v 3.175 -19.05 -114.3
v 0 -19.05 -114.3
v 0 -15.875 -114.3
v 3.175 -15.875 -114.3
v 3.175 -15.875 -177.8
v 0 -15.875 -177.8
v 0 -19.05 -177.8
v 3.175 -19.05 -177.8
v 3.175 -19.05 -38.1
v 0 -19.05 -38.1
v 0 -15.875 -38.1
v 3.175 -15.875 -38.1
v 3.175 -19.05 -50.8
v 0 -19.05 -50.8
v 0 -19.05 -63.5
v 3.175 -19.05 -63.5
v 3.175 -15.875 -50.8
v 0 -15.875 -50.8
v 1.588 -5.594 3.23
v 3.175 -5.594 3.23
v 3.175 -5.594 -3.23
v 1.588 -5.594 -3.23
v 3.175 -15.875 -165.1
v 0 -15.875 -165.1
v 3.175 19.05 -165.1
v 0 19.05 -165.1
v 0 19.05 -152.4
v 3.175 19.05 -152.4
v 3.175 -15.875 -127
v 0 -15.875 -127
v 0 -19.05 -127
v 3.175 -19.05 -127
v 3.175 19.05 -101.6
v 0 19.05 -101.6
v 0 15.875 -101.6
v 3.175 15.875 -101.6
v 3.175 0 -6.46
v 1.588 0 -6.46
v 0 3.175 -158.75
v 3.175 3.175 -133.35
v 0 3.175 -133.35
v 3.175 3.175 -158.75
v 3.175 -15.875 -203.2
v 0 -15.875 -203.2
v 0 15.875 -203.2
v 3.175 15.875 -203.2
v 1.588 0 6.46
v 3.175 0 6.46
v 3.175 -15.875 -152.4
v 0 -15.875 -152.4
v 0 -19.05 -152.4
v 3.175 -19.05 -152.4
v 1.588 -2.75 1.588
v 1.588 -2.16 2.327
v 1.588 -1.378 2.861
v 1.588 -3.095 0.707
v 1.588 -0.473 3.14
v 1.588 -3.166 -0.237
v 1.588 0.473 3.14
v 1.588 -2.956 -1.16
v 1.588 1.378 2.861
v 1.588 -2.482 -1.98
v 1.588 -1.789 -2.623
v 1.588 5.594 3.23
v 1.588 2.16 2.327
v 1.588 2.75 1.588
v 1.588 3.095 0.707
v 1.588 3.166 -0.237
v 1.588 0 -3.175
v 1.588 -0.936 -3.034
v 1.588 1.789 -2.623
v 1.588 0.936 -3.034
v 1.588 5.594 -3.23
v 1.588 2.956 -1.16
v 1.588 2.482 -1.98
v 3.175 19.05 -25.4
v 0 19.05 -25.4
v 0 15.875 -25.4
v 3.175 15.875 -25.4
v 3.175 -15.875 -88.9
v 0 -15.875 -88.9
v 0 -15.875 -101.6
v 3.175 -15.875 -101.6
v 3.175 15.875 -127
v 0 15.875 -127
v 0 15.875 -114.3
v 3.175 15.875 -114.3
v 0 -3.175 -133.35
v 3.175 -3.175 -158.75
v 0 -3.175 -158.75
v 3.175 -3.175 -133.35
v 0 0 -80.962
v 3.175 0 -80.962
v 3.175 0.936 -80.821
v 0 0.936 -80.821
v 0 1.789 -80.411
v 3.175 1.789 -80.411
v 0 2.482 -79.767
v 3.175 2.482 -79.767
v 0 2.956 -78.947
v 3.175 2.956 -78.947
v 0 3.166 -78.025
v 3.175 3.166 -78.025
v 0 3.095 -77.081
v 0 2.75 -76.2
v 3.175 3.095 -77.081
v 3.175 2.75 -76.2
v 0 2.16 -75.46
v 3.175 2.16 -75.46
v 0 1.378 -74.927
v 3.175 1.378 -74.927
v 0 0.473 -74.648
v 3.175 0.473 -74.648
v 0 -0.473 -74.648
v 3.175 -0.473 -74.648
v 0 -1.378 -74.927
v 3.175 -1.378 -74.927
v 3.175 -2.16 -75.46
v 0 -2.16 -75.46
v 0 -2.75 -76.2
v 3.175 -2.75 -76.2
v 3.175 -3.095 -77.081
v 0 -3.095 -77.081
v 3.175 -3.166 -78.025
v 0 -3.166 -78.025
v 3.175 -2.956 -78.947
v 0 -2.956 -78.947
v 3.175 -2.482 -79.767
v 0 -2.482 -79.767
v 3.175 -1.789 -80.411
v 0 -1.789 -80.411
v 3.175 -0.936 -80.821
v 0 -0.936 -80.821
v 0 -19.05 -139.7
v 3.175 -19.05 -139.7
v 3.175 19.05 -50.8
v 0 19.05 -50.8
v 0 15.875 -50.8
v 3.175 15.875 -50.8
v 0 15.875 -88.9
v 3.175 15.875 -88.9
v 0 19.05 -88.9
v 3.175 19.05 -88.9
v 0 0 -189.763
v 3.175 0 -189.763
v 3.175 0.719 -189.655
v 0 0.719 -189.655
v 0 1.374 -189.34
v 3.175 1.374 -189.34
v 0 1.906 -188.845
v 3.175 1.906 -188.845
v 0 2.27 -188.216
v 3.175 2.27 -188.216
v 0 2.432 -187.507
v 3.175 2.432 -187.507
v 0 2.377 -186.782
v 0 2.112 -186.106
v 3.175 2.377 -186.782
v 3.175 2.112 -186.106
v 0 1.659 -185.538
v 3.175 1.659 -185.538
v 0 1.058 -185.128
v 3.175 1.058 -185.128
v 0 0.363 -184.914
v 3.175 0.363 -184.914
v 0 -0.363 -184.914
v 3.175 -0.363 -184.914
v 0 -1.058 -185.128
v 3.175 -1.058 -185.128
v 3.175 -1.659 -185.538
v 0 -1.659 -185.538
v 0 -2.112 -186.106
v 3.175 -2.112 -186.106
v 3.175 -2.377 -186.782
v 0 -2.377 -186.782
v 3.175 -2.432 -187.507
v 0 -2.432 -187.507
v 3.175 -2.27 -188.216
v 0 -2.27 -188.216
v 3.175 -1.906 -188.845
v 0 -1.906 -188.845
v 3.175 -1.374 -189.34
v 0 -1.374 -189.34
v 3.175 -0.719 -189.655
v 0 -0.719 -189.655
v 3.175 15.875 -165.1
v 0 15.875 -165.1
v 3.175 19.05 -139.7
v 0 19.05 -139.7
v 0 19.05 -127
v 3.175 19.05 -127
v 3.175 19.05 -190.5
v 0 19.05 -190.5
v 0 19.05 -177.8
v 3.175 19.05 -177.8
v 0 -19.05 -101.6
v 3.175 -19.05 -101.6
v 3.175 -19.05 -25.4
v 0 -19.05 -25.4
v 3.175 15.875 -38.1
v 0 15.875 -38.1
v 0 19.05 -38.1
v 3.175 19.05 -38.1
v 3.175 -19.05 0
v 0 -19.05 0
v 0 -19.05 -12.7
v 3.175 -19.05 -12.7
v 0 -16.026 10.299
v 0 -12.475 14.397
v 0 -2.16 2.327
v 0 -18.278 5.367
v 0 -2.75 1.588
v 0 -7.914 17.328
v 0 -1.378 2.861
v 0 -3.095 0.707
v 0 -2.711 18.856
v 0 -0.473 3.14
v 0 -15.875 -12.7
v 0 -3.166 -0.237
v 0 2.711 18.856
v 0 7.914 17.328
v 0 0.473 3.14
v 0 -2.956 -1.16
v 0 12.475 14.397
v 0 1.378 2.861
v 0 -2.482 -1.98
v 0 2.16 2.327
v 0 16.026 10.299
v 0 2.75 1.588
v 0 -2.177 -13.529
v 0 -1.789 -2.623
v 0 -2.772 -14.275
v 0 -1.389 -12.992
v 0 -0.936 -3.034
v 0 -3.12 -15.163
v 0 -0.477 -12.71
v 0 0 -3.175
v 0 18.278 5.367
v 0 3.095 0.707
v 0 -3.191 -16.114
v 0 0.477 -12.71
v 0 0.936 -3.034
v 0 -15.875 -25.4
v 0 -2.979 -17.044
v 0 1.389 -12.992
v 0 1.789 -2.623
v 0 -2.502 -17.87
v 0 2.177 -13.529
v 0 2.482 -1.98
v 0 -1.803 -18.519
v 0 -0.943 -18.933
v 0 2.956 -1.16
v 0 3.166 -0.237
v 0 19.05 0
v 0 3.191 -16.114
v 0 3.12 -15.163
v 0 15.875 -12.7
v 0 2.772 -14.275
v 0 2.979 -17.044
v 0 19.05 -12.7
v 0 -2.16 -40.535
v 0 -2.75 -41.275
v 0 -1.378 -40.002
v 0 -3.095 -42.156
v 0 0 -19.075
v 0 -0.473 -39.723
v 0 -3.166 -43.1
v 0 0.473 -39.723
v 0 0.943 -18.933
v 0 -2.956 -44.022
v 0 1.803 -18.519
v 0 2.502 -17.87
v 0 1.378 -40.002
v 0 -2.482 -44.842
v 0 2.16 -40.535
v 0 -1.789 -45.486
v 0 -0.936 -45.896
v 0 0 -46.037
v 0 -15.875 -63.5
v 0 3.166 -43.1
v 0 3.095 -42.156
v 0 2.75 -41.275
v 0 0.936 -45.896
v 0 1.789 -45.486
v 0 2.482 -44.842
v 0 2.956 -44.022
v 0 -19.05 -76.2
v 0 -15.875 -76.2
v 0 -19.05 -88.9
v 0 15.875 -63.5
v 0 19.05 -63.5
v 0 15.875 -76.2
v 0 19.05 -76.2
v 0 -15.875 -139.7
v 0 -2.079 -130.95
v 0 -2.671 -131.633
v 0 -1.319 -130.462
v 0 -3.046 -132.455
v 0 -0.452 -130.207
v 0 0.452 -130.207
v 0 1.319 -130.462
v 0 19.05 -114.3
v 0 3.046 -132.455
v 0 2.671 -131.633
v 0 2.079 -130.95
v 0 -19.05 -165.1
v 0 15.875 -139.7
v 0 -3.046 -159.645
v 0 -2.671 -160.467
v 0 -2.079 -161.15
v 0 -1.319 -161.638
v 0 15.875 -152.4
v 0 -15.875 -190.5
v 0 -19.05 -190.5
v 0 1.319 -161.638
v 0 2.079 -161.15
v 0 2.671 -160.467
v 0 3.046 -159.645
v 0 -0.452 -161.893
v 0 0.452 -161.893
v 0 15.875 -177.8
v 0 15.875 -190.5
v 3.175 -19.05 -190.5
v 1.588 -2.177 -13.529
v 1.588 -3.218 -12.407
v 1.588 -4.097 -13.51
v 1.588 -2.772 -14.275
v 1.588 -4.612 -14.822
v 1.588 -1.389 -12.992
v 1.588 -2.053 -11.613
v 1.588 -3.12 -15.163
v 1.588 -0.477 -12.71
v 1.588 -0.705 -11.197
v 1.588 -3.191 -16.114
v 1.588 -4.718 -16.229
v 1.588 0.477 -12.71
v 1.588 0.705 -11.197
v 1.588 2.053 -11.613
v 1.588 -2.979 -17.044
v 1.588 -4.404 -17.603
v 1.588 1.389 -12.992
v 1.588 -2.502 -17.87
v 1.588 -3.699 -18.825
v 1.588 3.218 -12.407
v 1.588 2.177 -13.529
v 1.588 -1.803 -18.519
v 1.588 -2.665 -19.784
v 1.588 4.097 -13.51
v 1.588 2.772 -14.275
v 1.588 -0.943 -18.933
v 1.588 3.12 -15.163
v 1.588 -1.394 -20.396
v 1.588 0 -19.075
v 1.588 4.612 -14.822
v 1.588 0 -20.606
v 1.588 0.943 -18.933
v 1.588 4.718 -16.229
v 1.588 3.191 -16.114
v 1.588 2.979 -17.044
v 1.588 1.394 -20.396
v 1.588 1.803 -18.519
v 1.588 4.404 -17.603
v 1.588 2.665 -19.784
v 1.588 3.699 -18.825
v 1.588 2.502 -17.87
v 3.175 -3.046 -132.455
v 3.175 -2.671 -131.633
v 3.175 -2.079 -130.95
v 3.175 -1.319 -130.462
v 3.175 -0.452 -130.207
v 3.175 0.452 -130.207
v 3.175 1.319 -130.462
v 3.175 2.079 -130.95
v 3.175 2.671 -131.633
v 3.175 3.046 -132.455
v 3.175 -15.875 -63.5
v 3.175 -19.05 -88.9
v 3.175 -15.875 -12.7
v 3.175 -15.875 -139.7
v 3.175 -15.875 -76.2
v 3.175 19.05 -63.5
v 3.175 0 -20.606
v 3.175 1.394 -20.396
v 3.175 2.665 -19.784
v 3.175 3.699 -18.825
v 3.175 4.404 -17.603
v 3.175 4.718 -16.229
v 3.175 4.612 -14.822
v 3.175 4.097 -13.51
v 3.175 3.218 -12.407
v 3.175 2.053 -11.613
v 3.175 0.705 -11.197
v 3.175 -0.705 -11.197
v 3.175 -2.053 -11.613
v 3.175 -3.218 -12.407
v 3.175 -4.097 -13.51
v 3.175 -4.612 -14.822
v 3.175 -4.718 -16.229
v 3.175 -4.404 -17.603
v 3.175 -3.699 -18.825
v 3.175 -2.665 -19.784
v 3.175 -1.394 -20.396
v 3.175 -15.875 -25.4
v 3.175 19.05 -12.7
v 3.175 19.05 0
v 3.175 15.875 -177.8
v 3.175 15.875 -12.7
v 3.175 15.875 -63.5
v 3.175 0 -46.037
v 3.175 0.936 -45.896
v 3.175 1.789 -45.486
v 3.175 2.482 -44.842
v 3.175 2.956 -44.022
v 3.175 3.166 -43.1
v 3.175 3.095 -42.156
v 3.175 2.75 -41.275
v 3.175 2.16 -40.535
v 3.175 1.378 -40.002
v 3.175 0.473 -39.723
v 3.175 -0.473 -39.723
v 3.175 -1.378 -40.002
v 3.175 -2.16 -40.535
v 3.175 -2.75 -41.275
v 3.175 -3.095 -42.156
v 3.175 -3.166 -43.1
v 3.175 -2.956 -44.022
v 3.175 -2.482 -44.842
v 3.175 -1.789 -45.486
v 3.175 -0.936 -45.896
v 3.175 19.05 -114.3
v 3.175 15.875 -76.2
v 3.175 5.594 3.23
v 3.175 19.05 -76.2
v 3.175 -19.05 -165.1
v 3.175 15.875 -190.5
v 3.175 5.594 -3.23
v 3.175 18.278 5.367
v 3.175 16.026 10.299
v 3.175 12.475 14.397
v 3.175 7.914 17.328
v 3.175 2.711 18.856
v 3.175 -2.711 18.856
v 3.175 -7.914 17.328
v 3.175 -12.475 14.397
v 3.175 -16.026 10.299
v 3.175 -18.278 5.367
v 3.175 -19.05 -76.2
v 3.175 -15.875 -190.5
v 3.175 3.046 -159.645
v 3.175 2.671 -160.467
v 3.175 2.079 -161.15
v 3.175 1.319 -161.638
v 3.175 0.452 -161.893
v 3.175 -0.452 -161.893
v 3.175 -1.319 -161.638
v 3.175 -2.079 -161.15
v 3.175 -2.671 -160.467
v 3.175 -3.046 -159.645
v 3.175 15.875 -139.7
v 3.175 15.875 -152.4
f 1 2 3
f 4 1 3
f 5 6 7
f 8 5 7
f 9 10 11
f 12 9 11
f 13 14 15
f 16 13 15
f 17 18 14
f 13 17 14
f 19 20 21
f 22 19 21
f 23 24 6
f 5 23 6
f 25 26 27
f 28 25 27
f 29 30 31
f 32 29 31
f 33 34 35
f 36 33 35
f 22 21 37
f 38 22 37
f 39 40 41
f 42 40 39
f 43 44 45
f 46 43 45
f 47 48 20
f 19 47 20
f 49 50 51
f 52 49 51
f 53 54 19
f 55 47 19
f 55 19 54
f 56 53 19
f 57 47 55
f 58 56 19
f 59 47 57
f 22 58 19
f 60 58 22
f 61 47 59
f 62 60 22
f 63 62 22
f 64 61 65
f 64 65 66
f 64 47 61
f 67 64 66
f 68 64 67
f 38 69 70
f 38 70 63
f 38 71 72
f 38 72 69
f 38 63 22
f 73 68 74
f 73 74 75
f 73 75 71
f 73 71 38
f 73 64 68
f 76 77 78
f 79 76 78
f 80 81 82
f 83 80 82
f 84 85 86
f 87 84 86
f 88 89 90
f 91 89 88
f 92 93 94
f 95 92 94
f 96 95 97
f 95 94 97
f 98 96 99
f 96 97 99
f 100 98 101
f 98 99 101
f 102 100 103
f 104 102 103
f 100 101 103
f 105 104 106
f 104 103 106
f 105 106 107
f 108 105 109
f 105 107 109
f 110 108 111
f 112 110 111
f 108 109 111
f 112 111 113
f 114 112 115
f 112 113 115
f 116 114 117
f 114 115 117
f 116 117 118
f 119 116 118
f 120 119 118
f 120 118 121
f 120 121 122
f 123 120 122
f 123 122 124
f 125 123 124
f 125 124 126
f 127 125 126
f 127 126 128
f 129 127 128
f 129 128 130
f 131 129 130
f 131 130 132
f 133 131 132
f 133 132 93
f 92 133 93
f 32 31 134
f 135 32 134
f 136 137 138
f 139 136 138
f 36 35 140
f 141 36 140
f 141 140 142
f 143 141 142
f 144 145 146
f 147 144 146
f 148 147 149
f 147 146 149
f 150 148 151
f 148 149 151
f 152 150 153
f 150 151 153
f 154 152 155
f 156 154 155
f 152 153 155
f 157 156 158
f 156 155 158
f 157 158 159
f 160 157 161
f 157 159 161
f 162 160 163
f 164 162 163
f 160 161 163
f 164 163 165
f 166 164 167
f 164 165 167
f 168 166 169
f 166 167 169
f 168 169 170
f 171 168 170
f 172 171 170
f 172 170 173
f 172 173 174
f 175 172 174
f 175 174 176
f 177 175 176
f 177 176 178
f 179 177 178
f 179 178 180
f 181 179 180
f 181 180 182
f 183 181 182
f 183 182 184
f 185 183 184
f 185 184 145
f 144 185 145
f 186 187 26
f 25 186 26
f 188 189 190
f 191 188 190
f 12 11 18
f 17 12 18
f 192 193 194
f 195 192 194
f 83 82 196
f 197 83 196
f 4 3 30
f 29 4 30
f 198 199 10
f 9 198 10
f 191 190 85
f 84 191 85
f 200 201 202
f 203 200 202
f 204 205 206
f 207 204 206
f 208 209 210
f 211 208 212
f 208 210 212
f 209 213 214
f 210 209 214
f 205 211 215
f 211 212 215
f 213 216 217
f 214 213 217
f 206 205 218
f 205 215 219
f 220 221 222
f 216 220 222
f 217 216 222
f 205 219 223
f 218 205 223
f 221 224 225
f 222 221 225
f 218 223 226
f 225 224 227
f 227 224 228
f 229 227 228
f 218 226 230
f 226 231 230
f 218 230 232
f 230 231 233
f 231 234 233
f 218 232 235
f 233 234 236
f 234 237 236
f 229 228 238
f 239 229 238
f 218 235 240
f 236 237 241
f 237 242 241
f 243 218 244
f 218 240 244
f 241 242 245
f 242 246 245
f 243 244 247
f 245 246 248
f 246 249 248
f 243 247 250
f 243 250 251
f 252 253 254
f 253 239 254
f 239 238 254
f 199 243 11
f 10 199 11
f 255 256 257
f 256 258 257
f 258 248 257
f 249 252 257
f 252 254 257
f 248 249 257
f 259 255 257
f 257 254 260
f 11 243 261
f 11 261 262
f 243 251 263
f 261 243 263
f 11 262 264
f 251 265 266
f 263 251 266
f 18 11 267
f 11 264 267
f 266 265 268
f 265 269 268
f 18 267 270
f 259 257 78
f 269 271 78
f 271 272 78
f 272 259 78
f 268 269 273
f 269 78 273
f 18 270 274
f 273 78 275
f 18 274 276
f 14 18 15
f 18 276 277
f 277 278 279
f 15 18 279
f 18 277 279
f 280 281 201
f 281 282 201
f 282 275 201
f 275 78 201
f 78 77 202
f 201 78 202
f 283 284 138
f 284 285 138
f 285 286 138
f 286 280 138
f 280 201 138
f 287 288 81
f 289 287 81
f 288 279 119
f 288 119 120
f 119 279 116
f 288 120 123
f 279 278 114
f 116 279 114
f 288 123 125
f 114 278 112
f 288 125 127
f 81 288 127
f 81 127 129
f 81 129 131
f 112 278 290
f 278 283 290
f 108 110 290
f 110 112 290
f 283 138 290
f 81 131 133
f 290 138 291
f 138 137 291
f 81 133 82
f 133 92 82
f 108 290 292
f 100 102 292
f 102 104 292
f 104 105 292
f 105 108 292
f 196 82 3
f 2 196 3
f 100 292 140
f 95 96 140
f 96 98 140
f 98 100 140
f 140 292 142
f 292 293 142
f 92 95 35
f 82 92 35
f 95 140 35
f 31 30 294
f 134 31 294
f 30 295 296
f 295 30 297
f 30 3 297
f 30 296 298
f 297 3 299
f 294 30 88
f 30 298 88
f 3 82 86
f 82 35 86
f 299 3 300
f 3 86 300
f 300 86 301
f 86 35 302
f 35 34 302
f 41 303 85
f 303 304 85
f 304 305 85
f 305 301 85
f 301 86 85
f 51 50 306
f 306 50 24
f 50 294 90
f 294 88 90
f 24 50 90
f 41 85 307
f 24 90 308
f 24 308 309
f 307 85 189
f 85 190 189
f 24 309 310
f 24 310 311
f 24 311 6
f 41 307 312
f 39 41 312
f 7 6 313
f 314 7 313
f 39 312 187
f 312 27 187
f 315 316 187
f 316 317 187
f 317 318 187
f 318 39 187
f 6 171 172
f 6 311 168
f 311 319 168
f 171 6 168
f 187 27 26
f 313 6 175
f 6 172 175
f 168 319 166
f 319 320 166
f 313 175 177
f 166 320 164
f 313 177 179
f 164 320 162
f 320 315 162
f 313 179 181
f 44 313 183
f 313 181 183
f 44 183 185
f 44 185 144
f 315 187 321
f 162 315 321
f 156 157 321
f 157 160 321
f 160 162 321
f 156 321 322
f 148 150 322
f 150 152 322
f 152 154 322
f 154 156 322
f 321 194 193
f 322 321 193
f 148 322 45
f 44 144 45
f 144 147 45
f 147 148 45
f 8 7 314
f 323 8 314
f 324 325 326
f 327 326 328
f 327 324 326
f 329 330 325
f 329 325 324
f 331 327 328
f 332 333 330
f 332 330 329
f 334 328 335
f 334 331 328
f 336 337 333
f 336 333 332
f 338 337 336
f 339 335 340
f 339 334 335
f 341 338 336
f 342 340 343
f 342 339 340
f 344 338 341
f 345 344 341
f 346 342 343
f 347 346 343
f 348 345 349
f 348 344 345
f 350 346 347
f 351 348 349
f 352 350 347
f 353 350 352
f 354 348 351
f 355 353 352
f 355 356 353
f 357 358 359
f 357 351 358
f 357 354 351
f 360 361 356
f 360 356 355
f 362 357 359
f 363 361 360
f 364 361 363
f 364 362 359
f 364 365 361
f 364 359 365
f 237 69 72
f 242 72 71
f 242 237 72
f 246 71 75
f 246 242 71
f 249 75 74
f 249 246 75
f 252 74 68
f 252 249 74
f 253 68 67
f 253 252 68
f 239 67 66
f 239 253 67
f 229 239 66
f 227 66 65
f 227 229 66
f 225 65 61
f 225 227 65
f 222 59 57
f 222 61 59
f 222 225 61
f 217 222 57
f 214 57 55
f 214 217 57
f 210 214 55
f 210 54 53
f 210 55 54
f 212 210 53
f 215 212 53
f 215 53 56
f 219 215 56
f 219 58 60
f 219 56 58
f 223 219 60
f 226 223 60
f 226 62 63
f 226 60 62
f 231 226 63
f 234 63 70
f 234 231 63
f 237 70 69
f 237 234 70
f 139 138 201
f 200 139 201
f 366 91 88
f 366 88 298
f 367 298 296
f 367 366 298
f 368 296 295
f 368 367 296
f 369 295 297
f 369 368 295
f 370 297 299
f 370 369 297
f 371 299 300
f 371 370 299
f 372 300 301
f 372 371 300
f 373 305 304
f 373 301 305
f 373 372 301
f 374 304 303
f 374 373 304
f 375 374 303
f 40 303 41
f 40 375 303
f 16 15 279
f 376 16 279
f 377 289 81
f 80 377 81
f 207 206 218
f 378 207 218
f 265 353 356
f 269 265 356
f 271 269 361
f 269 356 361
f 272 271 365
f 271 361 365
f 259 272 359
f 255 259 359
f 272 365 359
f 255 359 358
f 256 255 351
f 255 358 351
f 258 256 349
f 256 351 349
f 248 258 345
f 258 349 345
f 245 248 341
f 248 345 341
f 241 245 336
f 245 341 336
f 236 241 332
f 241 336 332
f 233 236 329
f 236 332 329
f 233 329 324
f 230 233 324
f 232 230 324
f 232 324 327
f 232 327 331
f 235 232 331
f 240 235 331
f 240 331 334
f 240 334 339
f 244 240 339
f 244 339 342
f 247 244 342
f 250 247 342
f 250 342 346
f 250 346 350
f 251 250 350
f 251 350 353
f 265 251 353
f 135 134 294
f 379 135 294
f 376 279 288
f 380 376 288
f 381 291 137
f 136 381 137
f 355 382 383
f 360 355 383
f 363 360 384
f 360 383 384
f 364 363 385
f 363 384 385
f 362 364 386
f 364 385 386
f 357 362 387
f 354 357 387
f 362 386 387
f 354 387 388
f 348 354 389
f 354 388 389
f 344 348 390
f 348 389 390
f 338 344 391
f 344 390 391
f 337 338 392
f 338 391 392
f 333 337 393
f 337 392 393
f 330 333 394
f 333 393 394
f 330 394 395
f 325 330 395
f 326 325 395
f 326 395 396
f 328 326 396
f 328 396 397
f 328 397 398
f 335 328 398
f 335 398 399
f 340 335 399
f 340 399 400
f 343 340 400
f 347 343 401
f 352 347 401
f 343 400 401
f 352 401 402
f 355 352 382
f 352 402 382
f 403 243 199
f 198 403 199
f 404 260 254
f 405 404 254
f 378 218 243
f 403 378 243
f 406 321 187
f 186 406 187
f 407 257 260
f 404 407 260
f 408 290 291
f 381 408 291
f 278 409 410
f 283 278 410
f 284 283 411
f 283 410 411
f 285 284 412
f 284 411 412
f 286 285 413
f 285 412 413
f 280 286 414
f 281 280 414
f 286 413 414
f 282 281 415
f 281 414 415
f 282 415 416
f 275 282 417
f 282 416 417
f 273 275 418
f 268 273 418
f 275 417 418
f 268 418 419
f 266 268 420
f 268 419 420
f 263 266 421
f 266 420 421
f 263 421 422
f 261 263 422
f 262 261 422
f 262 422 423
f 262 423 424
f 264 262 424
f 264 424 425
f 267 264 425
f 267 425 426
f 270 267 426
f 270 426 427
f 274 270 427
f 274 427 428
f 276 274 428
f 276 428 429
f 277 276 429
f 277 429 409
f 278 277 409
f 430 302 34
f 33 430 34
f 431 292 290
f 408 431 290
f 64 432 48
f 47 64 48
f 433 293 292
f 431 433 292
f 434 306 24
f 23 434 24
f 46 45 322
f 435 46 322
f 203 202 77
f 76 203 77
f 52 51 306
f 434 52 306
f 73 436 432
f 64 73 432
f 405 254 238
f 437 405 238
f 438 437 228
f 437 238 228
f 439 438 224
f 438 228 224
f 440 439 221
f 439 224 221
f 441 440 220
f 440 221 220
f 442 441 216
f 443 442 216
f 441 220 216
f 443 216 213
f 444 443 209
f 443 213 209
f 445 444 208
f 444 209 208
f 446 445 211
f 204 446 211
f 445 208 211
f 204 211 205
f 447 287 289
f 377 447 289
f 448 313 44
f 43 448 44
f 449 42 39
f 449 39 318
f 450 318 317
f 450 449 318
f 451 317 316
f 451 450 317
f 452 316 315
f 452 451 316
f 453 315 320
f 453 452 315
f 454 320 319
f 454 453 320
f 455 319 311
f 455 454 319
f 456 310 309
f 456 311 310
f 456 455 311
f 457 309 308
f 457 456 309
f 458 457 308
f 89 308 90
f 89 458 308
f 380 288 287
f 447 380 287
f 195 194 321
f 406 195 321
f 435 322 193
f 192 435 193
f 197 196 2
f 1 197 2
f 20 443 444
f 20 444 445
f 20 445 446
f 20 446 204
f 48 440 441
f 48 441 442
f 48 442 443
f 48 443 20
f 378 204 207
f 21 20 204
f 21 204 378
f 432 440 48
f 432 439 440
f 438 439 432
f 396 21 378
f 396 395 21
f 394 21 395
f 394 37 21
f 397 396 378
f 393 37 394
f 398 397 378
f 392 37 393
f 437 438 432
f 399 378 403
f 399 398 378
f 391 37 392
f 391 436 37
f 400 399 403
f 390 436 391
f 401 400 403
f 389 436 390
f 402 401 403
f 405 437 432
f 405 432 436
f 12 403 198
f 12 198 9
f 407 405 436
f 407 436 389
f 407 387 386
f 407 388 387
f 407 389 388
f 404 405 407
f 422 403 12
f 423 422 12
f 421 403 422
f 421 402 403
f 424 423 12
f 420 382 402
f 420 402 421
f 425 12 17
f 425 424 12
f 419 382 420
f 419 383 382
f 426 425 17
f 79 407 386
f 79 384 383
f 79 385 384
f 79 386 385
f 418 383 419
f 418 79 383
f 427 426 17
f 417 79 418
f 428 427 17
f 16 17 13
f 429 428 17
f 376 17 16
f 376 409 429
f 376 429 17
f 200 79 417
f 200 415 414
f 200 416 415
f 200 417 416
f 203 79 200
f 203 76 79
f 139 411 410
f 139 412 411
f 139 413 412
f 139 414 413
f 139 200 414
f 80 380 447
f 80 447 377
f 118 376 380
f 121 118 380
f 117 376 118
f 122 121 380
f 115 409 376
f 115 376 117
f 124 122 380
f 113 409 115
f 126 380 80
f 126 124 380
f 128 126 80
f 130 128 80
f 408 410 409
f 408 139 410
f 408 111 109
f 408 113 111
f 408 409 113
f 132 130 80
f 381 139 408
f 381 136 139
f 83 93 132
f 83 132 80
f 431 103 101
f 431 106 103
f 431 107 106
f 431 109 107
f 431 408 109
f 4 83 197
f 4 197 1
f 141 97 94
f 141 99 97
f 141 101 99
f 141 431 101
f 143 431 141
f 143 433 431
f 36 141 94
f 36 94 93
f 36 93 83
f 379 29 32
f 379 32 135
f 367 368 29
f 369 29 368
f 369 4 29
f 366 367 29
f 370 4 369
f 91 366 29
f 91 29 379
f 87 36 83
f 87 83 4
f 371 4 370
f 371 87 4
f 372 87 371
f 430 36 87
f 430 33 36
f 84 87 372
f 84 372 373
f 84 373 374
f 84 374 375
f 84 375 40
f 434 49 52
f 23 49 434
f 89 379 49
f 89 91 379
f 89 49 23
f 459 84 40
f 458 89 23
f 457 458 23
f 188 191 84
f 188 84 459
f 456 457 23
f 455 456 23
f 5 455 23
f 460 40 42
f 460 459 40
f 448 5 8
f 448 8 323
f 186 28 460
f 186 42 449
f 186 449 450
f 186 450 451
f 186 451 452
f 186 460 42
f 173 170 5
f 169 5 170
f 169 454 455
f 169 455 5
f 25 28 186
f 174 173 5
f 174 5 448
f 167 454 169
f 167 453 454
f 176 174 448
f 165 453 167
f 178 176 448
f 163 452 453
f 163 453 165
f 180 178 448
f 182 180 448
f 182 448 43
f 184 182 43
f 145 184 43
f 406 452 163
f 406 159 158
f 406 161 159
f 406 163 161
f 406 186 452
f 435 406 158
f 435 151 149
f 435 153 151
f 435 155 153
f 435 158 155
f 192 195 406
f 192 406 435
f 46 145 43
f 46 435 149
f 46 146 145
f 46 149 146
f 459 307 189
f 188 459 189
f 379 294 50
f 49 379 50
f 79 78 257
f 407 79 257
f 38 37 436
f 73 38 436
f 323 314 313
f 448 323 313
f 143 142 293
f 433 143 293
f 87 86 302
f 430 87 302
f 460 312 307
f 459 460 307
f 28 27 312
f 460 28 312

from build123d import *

# Parameters (mm, degrees)
SKETCH1_R           = 3.175
BOSS_EXTRUDE1_DEPTH = 3.175
SKETCH2_R           = 3.2004
SKETCH2_R_2         = 2.4384
SKETCH2_R_3         = 3.175
CUT_EXTRUDE2_DEPTH  = 205.115710138
SKETCH3_R           = 4.73075
CUT_EXTRUDE3_DEPTH  = 1.5875
CUT_EXTRUDE4_DEPTH  = 205.115710138


with BuildPart() as part:
    # Sketch1 → Boss-Extrude1 (new body)
    with BuildSketch(Plane(origin=(0, 0, 0), x_dir=(0, 0, -1), z_dir=(1, 0, 0))):
        with BuildLine():
            Line((12.7, 19.05), (0, 19.05))
            ThreePointArc((0, 19.05), (-19.05, 0), (0, -19.05))
            Line((0, -19.05), (12.7, -19.05))
            Line((12.7, -19.05), (12.7, -15.875))
            Line((12.7, -15.875), (25.4, -15.875))
            Line((25.4, -15.875), (25.4, -19.05))
            Line((25.4, -19.05), (38.1, -19.05))
            Line((38.1, -19.05), (38.1, -15.875))
            Line((38.1, -15.875), (50.8, -15.875))
            Line((50.8, -15.875), (50.8, -19.05))
            Line((50.8, -19.05), (63.5, -19.05))
            Line((63.5, -19.05), (63.5, -15.875))
            Line((63.5, -15.875), (76.2, -15.875))
            Line((76.2, -15.875), (76.2, -19.05))
            Line((76.2, -19.05), (88.9, -19.05))
            Line((88.9, -19.05), (88.9, -15.875))
            Line((88.9, -15.875), (101.6, -15.875))
            Line((101.6, -15.875), (101.6, -19.05))
            Line((101.6, -19.05), (114.3, -19.05))
            Line((114.3, -19.05), (114.3, -15.875))
            Line((114.3, -15.875), (127, -15.875))
            Line((127, -15.875), (127, -19.05))
            Line((127, -19.05), (139.7, -19.05))
            Line((139.7, -19.05), (139.7, -15.875))
            Line((139.7, -15.875), (152.4, -15.875))
            Line((152.4, -15.875), (152.4, -19.05))
            Line((152.4, -19.05), (165.1, -19.05))
            Line((165.1, -19.05), (165.1, -15.875))
            Line((165.1, -15.875), (177.8, -15.875))
            Line((177.8, -15.875), (177.8, -19.05))
            Line((177.8, -19.05), (190.5, -19.05))
            Line((190.5, -19.05), (190.5, -15.875))
            Line((190.5, -15.875), (203.2, -15.875))
            Line((203.2, -15.875), (203.2, 15.875))
            Line((203.2, 15.875), (190.5, 15.875))
            Line((190.5, 15.875), (190.5, 19.05))
            Line((190.5, 19.05), (177.8, 19.05))
            Line((177.8, 19.05), (177.8, 15.875))
            Line((177.8, 15.875), (165.1, 15.875))
            Line((165.1, 15.875), (165.1, 19.05))
            Line((165.1, 19.05), (152.4, 19.05))
            Line((152.4, 19.05), (152.4, 15.875))
            Line((152.4, 15.875), (139.7, 15.875))
            Line((139.7, 15.875), (139.7, 19.05))
            Line((139.7, 19.05), (127, 19.05))
            Line((127, 19.05), (127, 15.875))
            Line((127, 15.875), (114.3, 15.875))
            Line((114.3, 15.875), (114.3, 19.05))
            Line((114.3, 19.05), (101.6, 19.05))
            Line((101.6, 19.05), (101.6, 15.875))
            Line((101.6, 15.875), (88.9, 15.875))
            Line((88.9, 15.875), (88.9, 19.05))
            Line((88.9, 19.05), (76.2, 19.05))
            Line((76.2, 19.05), (76.2, 15.875))
            Line((76.2, 15.875), (63.5, 15.875))
            Line((63.5, 15.875), (63.5, 19.05))
            Line((63.5, 19.05), (50.8, 19.05))
            Line((50.8, 19.05), (50.8, 15.875))
            Line((50.8, 15.875), (38.1, 15.875))
            Line((38.1, 15.875), (38.1, 19.05))
            Line((38.1, 19.05), (25.4, 19.05))
            Line((25.4, 19.05), (25.4, 15.875))
            Line((25.4, 15.875), (12.7, 15.875))
            Line((12.7, 15.875), (12.7, 19.05))
        make_face()
        Circle(SKETCH1_R, mode=Mode.SUBTRACT)
    extrude(amount=BOSS_EXTRUDE1_DEPTH)

    # Sketch2 → Cut-Extrude2 (cut, through all)
    with BuildSketch(Plane(origin=(3.175, 0, 0), x_dir=(0, 0, -1), z_dir=(1, 0, 0))):
        with Locations((15.875, 0)):
            Circle(SKETCH2_R)
        with Locations((187.325, 0)):
            Circle(SKETCH2_R_2)
        with Locations((42.8625, 0)):
            Circle(SKETCH2_R_3)
        with Locations((77.7875, 0)):
            Circle(SKETCH2_R_3)
    extrude(amount=-CUT_EXTRUDE2_DEPTH, mode=Mode.SUBTRACT)

    # Sketch3 → Cut-Extrude3 (cut)
    with BuildSketch(Plane(origin=(3.175, 0, 0), x_dir=(0, 0, -1), z_dir=(1, 0, 0))):
        with Locations((15.875, 0)):
            Circle(SKETCH3_R)
        Polygon((3.229899478, -5.59435), (6.459798957, 0), (3.229899478, 5.59435), (-3.229899478, 5.59435), (-6.459798957, 0), (-3.229899478, -5.59435), align=None)
    extrude(amount=-CUT_EXTRUDE3_DEPTH, mode=Mode.SUBTRACT)

    # Sketch4 → Cut-Extrude4 (cut, through all)
    with BuildSketch(Plane(origin=(3.175, 0, 0), x_dir=(0, 0, -1), z_dir=(1, 0, 0))):
        with BuildLine():
            Line((133.35, 3.175), (158.75, 3.175))
            ThreePointArc((158.75, 3.175), (161.925, 0), (158.75, -3.175))
            Line((158.75, -3.175), (133.35, -3.175))
            ThreePointArc((133.35, -3.175), (130.175, 0), (133.35, 3.175))
        make_face()
    extrude(amount=-CUT_EXTRUDE4_DEPTH, mode=Mode.SUBTRACT)


solid = part.part
